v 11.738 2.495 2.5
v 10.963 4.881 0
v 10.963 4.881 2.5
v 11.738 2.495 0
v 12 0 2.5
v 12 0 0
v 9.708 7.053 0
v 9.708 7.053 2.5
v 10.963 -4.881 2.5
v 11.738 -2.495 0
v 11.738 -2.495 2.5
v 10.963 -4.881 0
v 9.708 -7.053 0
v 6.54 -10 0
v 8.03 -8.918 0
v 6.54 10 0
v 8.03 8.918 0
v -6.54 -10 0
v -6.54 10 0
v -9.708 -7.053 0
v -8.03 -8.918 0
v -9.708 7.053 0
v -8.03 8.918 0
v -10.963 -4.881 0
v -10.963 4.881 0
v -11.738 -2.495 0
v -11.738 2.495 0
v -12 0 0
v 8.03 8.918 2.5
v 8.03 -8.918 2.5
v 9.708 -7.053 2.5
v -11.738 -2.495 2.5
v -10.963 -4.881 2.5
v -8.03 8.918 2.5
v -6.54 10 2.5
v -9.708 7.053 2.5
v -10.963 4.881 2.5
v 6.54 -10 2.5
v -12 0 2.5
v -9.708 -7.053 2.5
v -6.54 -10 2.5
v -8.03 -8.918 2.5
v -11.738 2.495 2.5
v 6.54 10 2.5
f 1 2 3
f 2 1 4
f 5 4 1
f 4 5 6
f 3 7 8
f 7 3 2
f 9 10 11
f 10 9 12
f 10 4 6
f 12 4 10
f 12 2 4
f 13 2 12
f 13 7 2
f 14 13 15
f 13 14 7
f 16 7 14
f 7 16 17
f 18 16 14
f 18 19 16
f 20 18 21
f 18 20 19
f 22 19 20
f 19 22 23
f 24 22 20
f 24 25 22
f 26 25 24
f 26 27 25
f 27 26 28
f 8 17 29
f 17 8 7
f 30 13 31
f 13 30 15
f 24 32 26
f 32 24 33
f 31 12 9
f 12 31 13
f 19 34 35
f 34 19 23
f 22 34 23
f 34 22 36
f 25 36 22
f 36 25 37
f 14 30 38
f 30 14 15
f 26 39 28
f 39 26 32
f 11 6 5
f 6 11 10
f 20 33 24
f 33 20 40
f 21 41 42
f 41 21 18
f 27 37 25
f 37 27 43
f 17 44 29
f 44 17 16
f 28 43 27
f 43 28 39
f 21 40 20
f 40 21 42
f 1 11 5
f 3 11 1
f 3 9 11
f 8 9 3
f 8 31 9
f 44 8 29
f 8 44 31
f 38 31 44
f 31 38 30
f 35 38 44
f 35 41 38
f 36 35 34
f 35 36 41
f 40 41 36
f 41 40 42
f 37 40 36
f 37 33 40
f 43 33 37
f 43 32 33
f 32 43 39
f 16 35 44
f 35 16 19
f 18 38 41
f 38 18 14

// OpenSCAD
// Generated by generate_scads.py
intersection() {
  cylinder(h=10, r=12, center=false);
  cube(size=[25,30,5], center=true);
  cube(size=[25,20,5], center=true);
}
